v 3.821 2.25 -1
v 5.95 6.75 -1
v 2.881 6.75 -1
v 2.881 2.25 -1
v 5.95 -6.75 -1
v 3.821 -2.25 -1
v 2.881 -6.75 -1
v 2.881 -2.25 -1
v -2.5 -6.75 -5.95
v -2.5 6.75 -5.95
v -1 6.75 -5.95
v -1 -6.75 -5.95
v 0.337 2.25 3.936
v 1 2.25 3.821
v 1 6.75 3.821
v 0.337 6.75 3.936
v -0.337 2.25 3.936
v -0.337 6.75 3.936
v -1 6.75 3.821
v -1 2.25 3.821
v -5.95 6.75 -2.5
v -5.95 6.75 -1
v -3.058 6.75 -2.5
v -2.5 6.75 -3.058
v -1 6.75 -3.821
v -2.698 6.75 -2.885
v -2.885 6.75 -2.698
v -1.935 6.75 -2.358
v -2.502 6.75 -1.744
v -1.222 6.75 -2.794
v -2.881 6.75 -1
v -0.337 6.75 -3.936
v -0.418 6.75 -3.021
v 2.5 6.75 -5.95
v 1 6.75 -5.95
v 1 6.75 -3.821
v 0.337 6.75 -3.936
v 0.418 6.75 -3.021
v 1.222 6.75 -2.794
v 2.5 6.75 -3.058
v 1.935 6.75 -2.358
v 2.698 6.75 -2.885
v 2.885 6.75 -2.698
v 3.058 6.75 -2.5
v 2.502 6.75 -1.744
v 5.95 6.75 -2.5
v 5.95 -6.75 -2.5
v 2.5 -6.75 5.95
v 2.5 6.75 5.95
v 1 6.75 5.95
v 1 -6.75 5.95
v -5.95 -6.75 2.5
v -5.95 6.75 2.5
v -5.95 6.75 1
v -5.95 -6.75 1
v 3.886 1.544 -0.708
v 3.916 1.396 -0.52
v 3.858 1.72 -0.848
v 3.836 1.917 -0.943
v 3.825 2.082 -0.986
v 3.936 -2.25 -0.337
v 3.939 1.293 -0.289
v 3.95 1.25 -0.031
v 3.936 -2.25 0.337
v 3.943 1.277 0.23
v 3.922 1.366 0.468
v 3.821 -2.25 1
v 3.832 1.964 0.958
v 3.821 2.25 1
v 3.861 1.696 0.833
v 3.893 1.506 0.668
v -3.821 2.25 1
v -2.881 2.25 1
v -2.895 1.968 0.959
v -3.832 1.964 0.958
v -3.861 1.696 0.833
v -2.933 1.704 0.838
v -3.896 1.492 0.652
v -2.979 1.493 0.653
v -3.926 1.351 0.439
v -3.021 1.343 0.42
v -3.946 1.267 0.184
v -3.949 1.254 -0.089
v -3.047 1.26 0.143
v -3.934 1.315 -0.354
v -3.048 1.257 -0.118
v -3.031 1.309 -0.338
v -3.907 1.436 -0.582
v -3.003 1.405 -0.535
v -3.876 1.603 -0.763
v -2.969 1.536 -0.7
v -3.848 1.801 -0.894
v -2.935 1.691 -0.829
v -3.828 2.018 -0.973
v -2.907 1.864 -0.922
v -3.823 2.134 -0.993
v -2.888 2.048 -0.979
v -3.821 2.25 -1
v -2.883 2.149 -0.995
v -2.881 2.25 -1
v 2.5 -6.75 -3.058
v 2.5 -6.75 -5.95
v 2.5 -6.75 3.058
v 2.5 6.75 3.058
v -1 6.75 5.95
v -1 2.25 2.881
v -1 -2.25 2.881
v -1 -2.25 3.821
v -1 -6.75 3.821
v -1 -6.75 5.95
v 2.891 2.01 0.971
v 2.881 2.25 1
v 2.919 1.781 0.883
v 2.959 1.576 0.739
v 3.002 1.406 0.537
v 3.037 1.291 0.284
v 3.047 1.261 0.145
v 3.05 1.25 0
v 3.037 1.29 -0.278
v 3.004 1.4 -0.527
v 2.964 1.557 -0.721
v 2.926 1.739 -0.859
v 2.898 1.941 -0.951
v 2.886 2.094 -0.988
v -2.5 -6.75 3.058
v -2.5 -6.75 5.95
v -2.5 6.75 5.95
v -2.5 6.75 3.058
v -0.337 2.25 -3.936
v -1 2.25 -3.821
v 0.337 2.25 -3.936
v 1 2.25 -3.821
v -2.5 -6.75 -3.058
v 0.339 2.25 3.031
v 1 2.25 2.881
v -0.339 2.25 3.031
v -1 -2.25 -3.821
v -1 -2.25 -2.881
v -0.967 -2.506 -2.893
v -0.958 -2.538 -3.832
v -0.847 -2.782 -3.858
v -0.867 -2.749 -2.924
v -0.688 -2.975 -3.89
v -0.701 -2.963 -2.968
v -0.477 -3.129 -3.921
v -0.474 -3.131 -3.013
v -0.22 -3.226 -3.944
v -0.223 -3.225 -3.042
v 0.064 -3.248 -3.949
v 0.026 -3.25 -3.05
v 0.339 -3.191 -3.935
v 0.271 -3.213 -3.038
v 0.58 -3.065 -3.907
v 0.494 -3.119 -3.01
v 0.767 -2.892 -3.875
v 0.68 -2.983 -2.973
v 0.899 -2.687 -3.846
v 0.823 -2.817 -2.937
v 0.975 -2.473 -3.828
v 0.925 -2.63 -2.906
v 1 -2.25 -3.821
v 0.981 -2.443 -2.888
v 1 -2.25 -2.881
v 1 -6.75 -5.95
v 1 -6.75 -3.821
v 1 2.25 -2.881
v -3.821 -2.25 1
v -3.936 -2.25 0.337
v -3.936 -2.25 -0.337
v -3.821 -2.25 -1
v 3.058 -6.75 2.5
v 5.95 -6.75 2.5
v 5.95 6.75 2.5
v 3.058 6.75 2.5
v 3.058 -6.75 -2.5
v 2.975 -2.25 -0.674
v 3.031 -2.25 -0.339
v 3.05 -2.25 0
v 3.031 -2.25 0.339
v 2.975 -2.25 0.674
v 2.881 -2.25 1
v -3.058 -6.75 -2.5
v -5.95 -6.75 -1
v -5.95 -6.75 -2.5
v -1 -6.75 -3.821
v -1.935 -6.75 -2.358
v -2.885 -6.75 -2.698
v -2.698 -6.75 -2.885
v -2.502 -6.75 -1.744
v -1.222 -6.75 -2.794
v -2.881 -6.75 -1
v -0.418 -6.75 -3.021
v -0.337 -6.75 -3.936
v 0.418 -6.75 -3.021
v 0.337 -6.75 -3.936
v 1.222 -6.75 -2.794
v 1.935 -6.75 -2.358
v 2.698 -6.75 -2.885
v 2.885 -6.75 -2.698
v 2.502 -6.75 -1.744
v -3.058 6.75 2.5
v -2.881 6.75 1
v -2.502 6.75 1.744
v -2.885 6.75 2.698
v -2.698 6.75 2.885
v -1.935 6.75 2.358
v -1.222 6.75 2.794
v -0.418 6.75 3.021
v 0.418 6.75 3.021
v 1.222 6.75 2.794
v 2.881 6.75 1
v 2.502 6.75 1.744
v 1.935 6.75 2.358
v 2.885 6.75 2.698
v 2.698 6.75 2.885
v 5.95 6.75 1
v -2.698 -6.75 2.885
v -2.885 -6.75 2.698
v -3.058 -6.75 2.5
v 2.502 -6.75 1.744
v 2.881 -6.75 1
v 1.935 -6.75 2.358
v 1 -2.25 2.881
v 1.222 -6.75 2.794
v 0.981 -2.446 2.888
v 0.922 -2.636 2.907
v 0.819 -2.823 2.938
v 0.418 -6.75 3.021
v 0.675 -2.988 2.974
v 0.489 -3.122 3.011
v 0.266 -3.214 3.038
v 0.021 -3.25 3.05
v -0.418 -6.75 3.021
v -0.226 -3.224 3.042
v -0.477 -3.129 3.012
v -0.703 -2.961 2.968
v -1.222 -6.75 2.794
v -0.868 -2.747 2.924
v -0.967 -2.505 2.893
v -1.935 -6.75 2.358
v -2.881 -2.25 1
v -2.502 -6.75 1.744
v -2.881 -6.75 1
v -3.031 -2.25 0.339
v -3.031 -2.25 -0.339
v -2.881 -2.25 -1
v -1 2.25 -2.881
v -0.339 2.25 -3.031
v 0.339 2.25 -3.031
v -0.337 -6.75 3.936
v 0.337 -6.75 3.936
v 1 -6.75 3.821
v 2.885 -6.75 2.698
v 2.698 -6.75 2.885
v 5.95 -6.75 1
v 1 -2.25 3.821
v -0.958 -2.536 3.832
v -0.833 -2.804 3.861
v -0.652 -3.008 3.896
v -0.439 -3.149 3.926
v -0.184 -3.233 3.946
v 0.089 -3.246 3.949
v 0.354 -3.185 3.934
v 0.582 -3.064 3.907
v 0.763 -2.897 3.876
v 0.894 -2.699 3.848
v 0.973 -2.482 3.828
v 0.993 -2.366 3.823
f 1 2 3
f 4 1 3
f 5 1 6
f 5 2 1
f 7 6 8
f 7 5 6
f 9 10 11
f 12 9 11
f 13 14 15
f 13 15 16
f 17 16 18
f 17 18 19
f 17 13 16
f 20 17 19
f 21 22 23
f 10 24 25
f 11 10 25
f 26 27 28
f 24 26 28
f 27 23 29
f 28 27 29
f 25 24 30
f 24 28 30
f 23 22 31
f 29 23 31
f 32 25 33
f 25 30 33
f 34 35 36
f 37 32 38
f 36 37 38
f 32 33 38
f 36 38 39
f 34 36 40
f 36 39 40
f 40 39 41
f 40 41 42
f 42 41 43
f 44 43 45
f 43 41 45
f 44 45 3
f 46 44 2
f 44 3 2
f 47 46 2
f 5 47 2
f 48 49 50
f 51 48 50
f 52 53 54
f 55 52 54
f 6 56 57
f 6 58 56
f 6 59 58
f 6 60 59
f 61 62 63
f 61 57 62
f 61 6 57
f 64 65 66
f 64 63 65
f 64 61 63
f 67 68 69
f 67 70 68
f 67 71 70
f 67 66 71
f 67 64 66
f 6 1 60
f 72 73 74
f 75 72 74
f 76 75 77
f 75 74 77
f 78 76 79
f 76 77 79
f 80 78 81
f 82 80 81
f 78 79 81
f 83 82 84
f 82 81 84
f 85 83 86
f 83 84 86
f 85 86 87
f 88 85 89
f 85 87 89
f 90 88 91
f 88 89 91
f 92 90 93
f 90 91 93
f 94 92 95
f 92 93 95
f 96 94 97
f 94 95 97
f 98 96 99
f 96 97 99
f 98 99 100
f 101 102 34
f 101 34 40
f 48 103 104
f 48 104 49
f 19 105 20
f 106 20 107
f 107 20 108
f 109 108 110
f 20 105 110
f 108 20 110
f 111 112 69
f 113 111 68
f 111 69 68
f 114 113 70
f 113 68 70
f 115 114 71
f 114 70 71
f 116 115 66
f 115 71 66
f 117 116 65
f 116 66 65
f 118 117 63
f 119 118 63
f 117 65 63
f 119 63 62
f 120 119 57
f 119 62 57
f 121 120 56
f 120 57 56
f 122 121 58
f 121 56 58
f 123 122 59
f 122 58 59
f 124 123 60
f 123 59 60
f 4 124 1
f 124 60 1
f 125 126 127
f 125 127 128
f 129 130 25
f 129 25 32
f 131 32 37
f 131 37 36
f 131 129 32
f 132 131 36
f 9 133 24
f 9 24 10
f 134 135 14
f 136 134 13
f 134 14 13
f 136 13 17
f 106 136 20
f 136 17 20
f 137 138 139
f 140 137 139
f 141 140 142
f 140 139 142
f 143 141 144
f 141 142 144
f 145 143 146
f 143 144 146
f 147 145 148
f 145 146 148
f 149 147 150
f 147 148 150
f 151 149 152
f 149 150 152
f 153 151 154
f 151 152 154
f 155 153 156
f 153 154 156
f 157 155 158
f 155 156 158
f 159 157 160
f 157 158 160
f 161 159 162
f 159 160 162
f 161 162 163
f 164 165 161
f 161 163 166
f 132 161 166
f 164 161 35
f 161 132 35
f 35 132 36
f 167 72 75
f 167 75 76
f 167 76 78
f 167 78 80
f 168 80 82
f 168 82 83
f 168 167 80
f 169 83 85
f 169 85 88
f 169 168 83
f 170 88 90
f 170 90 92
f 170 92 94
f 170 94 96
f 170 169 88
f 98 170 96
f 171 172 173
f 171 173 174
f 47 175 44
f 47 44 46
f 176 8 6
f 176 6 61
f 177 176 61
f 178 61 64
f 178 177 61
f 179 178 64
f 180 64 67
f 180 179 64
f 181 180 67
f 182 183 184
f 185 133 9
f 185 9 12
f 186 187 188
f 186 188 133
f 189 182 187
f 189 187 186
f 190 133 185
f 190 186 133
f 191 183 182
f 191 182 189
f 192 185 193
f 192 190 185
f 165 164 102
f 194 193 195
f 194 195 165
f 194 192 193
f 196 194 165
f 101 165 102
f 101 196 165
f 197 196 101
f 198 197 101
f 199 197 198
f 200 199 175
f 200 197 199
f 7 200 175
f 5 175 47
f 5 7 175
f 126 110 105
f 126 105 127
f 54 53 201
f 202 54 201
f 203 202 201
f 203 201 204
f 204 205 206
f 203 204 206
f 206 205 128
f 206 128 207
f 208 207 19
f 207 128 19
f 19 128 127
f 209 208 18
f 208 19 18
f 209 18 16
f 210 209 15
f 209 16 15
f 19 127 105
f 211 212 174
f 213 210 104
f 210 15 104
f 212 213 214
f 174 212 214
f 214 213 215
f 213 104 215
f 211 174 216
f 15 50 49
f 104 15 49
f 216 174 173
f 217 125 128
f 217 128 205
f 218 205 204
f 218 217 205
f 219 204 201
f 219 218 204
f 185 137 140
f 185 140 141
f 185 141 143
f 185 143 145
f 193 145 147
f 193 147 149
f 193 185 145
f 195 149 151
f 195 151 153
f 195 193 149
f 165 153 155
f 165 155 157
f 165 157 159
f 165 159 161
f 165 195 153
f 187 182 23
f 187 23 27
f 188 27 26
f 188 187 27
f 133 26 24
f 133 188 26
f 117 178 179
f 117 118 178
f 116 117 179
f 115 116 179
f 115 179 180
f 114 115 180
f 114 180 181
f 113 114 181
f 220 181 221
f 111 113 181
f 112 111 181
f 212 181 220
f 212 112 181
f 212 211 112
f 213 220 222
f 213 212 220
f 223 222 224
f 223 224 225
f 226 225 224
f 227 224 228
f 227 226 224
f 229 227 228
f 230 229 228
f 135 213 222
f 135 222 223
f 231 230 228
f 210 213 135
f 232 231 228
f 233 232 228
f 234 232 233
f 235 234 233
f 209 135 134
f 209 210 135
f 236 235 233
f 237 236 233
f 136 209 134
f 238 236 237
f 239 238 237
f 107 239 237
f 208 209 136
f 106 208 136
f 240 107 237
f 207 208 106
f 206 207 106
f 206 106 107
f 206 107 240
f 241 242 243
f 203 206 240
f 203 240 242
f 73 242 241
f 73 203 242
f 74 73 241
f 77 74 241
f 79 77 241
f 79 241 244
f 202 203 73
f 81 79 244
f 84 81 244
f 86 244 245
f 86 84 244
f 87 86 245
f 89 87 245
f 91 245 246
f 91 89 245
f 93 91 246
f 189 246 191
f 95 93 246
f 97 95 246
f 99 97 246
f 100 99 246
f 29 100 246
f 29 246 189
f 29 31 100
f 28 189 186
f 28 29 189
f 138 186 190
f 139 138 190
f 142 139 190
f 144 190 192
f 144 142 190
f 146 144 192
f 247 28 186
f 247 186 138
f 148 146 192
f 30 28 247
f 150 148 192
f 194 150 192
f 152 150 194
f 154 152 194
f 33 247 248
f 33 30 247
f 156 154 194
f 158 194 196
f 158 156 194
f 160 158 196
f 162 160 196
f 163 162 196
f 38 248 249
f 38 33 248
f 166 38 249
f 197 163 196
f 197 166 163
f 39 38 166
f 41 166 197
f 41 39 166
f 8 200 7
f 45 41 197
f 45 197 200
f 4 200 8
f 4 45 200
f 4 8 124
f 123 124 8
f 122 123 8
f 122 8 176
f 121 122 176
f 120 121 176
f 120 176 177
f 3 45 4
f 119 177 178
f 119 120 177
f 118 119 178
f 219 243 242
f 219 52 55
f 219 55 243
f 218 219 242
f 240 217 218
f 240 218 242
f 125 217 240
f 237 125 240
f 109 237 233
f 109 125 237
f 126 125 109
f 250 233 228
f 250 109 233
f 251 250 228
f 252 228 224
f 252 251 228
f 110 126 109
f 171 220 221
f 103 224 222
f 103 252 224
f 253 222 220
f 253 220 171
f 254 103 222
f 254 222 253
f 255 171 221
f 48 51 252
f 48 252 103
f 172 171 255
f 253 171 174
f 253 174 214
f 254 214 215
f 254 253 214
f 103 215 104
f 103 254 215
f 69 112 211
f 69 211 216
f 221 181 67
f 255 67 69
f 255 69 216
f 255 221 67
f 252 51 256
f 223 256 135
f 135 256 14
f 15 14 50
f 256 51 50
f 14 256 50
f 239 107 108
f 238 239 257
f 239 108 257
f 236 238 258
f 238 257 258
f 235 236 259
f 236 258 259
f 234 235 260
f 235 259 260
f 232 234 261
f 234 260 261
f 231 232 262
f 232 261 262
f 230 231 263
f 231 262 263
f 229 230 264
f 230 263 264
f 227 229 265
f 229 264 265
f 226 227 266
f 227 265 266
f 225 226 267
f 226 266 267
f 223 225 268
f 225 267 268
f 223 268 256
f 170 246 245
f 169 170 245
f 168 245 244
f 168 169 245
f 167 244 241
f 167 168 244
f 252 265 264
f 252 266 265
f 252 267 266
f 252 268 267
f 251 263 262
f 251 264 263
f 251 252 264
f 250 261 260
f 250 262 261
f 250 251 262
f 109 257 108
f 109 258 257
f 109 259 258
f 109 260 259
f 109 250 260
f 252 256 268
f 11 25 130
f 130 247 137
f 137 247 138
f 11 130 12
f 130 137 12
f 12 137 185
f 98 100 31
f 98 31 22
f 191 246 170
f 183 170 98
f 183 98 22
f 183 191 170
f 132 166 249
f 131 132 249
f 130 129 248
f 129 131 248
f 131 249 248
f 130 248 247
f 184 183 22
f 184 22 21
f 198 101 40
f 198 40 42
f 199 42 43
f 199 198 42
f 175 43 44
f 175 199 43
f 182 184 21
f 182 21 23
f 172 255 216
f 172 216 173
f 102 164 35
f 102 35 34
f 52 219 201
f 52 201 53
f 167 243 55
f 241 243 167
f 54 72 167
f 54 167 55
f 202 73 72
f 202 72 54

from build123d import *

# Parameters (mm, degrees)
F3_R     = 3.05
F4_DEPTH = 6.75
F5_W     = 4.5
F5_H     = 2
F6_DEPTH = 5
F8_DEPTH = 12.5


with BuildPart() as f4:
    # F3 (on Front) → F4 (new body, symmetric)
    with BuildSketch(Plane.XZ):
        with BuildLine():
            ThreePointArc((3.8213217609, -1), (3.9176983648, -0.5041225271), (3.95, 0))
            ThreePointArc((3.95, 0), (3.9176983648, 0.5041225271), (3.8213217609, 1))
            Line((3.8213217609, 1), (3.05, 1))
            Line((3.05, 1), (3.05, 2.5))
            Line((3.05, 2.5), (3.0581857367, 2.5))
            ThreePointArc((3.0581857367, 2.5), (2.7930717857, 2.7930717857), (2.5, 3.0581857367))
            Line((2.5, 3.0581857367), (2.5, 3.05))
            Line((2.5, 3.05), (1, 3.05))
            Line((1, 3.05), (1, 3.8213217609))
            ThreePointArc((1, 3.8213217609), (0, 3.95), (-1, 3.8213217609))
            Line((-1, 3.8213217609), (-1, 3.05))
            Line((-1, 3.05), (-2.5, 3.05))
            Line((-2.5, 3.05), (-2.5, 3.0581857367))
            ThreePointArc((-2.5, 3.0581857367), (-2.7930717857, 2.7930717857), (-3.0581857367, 2.5))
            Line((-3.0581857367, 2.5), (-3.05, 2.5))
            Line((-3.05, 2.5), (-3.05, 1))
            Line((-3.05, 1), (-3.8213217609, 1))
            ThreePointArc((-3.8213217609, 1), (-3.95, 0), (-3.8213217609, -1))
            Line((-3.8213217609, -1), (-3.05, -1))
            Line((-3.05, -1), (-3.05, -2.5))
            Line((-3.05, -2.5), (-3.0581857367, -2.5))
            ThreePointArc((-3.0581857367, -2.5), (-2.7930717857, -2.7930717857), (-2.5, -3.0581857367))
            Line((-2.5, -3.0581857367), (-2.5, -3.05))
            Line((-2.5, -3.05), (-1, -3.05))
            Line((-1, -3.05), (-1, -3.8213217609))
            ThreePointArc((-1, -3.8213217609), (0, -3.95), (1, -3.8213217609))
            Line((1, -3.8213217609), (1, -3.05))
            Line((1, -3.05), (2.5, -3.05))
            Line((2.5, -3.05), (2.5, -3.0581857367))
            ThreePointArc((2.5, -3.0581857367), (2.7930717857, -2.7930717857), (3.0581857367, -2.5))
            Line((3.0581857367, -2.5), (3.05, -2.5))
            Line((3.05, -2.5), (3.05, -1))
            Line((3.05, -1), (3.8213217609, -1))
        make_face()
        Circle(F3_R, mode=Mode.SUBTRACT)
        with BuildLine():
            Line((3.05, 1), (3.8213217609, 1))
            ThreePointArc((3.8213217609, 1), (3.5205689671, 1.7911153363), (3.0581857367, 2.5))
            Line((3.0581857367, 2.5), (3.05, 2.5))
            Line((3.05, 2.5), (3.05, 1))
        make_face()
        with BuildLine():
            ThreePointArc((3.0581857367, 2.5), (3.5205689671, 1.7911153363), (3.8213217609, 1))
            Line((3.8213217609, 1), (5.95, 1))
            Line((5.95, 1), (5.95, 2.5))
            Line((5.95, 2.5), (3.0581857367, 2.5))
        make_face()
        with BuildLine():
            Line((5.95, -1), (3.8213217609, -1))
            ThreePointArc((3.8213217609, -1), (3.5205689671, -1.7911153363), (3.0581857367, -2.5))
            Line((3.0581857367, -2.5), (5.95, -2.5))
            Line((5.95, -2.5), (5.95, -1))
        make_face()
        with BuildLine():
            ThreePointArc((3.0581857367, -2.5), (3.5205689671, -1.7911153363), (3.8213217609, -1))
            Line((3.8213217609, -1), (3.05, -1))
            Line((3.05, -1), (3.05, -2.5))
            Line((3.05, -2.5), (3.0581857367, -2.5))
        make_face()
        with BuildLine():
            Line((2.5, 3.05), (2.5, 3.0581857367))
            ThreePointArc((2.5, 3.0581857367), (1.7911153363, 3.5205689671), (1, 3.8213217609))
            Line((1, 3.8213217609), (1, 3.05))
            Line((1, 3.05), (2.5, 3.05))
        make_face()
        with BuildLine():
            ThreePointArc((1, 3.8213217609), (1.7911153363, 3.5205689671), (2.5, 3.0581857367))
            Line((2.5, 3.0581857367), (2.5, 5.95))
            Line((2.5, 5.95), (1, 5.95))
            Line((1, 5.95), (1, 3.8213217609))
        make_face()
        with BuildLine():
            Line((2.5, -5.95), (2.5, -3.0581857367))
            ThreePointArc((2.5, -3.0581857367), (1.7911153363, -3.5205689671), (1, -3.8213217609))
            Line((1, -3.8213217609), (1, -5.95))
            Line((1, -5.95), (2.5, -5.95))
        make_face()
        with BuildLine():
            ThreePointArc((1, -3.8213217609), (1.7911153363, -3.5205689671), (2.5, -3.0581857367))
            Line((2.5, -3.0581857367), (2.5, -3.05))
            Line((2.5, -3.05), (1, -3.05))
            Line((1, -3.05), (1, -3.8213217609))
        make_face()
        with BuildLine():
            Line((-1, 3.05), (-1, 3.8213217609))
            ThreePointArc((-1, 3.8213217609), (-1.7911153363, 3.5205689671), (-2.5, 3.0581857367))
            Line((-2.5, 3.0581857367), (-2.5, 3.05))
            Line((-2.5, 3.05), (-1, 3.05))
        make_face()
        with BuildLine():
            ThreePointArc((-2.5, 3.0581857367), (-1.7911153363, 3.5205689671), (-1, 3.8213217609))
            Line((-1, 3.8213217609), (-1, 5.95))
            Line((-1, 5.95), (-2.5, 5.95))
            Line((-2.5, 5.95), (-2.5, 3.0581857367))
        make_face()
        with BuildLine():
            Line((-1, -5.95), (-1, -3.8213217609))
            ThreePointArc((-1, -3.8213217609), (-1.7911153363, -3.5205689671), (-2.5, -3.0581857367))
            Line((-2.5, -3.0581857367), (-2.5, -5.95))
            Line((-2.5, -5.95), (-1, -5.95))
        make_face()
        with BuildLine():
            ThreePointArc((-2.5, -3.0581857367), (-1.7911153363, -3.5205689671), (-1, -3.8213217609))
            Line((-1, -3.8213217609), (-1, -3.05))
            Line((-1, -3.05), (-2.5, -3.05))
            Line((-2.5, -3.05), (-2.5, -3.0581857367))
        make_face()
        with BuildLine():
            Line((-3.05, 2.5), (-3.0581857367, 2.5))
            ThreePointArc((-3.0581857367, 2.5), (-3.5205689671, 1.7911153363), (-3.8213217609, 1))
            Line((-3.8213217609, 1), (-3.05, 1))
            Line((-3.05, 1), (-3.05, 2.5))
        make_face()
        with BuildLine():
            ThreePointArc((-3.8213217609, 1), (-3.5205689671, 1.7911153363), (-3.0581857367, 2.5))
            Line((-3.0581857367, 2.5), (-5.95, 2.5))
            Line((-5.95, 2.5), (-5.95, 1))
            Line((-5.95, 1), (-3.8213217609, 1))
        make_face()
        with BuildLine():
            Line((-5.95, -2.5), (-3.0581857367, -2.5))
            ThreePointArc((-3.0581857367, -2.5), (-3.5205689671, -1.7911153363), (-3.8213217609, -1))
            Line((-3.8213217609, -1), (-5.95, -1))
            Line((-5.95, -1), (-5.95, -2.5))
        make_face()
        with BuildLine():
            ThreePointArc((-3.8213217609, -1), (-3.5205689671, -1.7911153363), (-3.0581857367, -2.5))
            Line((-3.0581857367, -2.5), (-3.05, -2.5))
            Line((-3.05, -2.5), (-3.05, -1))
            Line((-3.05, -1), (-3.8213217609, -1))
        make_face()
    extrude(amount=F4_DEPTH, both=True)

    # F5 (on Right) → F6 (cut, symmetric)
    with BuildSketch(Plane.YZ):
        with Locations((-4.5, 0)):
            Rectangle(F5_W, F5_H)
        with Locations((4.5, 0)):
            Rectangle(F5_W, F5_H)
        with BuildLine():
            ThreePointArc((2.25, 1), (1.25, 0), (2.25, -1))
            Line((2.25, -1), (2.25, 1))
        make_face()
    extrude(amount=F6_DEPTH, both=True, mode=Mode.SUBTRACT)

    # F7 (on Top) → F8 (cut, symmetric)
    with BuildSketch(Plane.XY):
        with BuildLine():
            ThreePointArc((-1, -2.25), (0, -3.25), (1, -2.25))
            Line((1, -2.25), (1, 2.25))
            Line((1, 2.25), (-1, 2.25))
            Line((-1, 2.25), (-1, -2.25))
        make_face()
    extrude(amount=F8_DEPTH, both=True, mode=Mode.SUBTRACT)


solid = f4.part
